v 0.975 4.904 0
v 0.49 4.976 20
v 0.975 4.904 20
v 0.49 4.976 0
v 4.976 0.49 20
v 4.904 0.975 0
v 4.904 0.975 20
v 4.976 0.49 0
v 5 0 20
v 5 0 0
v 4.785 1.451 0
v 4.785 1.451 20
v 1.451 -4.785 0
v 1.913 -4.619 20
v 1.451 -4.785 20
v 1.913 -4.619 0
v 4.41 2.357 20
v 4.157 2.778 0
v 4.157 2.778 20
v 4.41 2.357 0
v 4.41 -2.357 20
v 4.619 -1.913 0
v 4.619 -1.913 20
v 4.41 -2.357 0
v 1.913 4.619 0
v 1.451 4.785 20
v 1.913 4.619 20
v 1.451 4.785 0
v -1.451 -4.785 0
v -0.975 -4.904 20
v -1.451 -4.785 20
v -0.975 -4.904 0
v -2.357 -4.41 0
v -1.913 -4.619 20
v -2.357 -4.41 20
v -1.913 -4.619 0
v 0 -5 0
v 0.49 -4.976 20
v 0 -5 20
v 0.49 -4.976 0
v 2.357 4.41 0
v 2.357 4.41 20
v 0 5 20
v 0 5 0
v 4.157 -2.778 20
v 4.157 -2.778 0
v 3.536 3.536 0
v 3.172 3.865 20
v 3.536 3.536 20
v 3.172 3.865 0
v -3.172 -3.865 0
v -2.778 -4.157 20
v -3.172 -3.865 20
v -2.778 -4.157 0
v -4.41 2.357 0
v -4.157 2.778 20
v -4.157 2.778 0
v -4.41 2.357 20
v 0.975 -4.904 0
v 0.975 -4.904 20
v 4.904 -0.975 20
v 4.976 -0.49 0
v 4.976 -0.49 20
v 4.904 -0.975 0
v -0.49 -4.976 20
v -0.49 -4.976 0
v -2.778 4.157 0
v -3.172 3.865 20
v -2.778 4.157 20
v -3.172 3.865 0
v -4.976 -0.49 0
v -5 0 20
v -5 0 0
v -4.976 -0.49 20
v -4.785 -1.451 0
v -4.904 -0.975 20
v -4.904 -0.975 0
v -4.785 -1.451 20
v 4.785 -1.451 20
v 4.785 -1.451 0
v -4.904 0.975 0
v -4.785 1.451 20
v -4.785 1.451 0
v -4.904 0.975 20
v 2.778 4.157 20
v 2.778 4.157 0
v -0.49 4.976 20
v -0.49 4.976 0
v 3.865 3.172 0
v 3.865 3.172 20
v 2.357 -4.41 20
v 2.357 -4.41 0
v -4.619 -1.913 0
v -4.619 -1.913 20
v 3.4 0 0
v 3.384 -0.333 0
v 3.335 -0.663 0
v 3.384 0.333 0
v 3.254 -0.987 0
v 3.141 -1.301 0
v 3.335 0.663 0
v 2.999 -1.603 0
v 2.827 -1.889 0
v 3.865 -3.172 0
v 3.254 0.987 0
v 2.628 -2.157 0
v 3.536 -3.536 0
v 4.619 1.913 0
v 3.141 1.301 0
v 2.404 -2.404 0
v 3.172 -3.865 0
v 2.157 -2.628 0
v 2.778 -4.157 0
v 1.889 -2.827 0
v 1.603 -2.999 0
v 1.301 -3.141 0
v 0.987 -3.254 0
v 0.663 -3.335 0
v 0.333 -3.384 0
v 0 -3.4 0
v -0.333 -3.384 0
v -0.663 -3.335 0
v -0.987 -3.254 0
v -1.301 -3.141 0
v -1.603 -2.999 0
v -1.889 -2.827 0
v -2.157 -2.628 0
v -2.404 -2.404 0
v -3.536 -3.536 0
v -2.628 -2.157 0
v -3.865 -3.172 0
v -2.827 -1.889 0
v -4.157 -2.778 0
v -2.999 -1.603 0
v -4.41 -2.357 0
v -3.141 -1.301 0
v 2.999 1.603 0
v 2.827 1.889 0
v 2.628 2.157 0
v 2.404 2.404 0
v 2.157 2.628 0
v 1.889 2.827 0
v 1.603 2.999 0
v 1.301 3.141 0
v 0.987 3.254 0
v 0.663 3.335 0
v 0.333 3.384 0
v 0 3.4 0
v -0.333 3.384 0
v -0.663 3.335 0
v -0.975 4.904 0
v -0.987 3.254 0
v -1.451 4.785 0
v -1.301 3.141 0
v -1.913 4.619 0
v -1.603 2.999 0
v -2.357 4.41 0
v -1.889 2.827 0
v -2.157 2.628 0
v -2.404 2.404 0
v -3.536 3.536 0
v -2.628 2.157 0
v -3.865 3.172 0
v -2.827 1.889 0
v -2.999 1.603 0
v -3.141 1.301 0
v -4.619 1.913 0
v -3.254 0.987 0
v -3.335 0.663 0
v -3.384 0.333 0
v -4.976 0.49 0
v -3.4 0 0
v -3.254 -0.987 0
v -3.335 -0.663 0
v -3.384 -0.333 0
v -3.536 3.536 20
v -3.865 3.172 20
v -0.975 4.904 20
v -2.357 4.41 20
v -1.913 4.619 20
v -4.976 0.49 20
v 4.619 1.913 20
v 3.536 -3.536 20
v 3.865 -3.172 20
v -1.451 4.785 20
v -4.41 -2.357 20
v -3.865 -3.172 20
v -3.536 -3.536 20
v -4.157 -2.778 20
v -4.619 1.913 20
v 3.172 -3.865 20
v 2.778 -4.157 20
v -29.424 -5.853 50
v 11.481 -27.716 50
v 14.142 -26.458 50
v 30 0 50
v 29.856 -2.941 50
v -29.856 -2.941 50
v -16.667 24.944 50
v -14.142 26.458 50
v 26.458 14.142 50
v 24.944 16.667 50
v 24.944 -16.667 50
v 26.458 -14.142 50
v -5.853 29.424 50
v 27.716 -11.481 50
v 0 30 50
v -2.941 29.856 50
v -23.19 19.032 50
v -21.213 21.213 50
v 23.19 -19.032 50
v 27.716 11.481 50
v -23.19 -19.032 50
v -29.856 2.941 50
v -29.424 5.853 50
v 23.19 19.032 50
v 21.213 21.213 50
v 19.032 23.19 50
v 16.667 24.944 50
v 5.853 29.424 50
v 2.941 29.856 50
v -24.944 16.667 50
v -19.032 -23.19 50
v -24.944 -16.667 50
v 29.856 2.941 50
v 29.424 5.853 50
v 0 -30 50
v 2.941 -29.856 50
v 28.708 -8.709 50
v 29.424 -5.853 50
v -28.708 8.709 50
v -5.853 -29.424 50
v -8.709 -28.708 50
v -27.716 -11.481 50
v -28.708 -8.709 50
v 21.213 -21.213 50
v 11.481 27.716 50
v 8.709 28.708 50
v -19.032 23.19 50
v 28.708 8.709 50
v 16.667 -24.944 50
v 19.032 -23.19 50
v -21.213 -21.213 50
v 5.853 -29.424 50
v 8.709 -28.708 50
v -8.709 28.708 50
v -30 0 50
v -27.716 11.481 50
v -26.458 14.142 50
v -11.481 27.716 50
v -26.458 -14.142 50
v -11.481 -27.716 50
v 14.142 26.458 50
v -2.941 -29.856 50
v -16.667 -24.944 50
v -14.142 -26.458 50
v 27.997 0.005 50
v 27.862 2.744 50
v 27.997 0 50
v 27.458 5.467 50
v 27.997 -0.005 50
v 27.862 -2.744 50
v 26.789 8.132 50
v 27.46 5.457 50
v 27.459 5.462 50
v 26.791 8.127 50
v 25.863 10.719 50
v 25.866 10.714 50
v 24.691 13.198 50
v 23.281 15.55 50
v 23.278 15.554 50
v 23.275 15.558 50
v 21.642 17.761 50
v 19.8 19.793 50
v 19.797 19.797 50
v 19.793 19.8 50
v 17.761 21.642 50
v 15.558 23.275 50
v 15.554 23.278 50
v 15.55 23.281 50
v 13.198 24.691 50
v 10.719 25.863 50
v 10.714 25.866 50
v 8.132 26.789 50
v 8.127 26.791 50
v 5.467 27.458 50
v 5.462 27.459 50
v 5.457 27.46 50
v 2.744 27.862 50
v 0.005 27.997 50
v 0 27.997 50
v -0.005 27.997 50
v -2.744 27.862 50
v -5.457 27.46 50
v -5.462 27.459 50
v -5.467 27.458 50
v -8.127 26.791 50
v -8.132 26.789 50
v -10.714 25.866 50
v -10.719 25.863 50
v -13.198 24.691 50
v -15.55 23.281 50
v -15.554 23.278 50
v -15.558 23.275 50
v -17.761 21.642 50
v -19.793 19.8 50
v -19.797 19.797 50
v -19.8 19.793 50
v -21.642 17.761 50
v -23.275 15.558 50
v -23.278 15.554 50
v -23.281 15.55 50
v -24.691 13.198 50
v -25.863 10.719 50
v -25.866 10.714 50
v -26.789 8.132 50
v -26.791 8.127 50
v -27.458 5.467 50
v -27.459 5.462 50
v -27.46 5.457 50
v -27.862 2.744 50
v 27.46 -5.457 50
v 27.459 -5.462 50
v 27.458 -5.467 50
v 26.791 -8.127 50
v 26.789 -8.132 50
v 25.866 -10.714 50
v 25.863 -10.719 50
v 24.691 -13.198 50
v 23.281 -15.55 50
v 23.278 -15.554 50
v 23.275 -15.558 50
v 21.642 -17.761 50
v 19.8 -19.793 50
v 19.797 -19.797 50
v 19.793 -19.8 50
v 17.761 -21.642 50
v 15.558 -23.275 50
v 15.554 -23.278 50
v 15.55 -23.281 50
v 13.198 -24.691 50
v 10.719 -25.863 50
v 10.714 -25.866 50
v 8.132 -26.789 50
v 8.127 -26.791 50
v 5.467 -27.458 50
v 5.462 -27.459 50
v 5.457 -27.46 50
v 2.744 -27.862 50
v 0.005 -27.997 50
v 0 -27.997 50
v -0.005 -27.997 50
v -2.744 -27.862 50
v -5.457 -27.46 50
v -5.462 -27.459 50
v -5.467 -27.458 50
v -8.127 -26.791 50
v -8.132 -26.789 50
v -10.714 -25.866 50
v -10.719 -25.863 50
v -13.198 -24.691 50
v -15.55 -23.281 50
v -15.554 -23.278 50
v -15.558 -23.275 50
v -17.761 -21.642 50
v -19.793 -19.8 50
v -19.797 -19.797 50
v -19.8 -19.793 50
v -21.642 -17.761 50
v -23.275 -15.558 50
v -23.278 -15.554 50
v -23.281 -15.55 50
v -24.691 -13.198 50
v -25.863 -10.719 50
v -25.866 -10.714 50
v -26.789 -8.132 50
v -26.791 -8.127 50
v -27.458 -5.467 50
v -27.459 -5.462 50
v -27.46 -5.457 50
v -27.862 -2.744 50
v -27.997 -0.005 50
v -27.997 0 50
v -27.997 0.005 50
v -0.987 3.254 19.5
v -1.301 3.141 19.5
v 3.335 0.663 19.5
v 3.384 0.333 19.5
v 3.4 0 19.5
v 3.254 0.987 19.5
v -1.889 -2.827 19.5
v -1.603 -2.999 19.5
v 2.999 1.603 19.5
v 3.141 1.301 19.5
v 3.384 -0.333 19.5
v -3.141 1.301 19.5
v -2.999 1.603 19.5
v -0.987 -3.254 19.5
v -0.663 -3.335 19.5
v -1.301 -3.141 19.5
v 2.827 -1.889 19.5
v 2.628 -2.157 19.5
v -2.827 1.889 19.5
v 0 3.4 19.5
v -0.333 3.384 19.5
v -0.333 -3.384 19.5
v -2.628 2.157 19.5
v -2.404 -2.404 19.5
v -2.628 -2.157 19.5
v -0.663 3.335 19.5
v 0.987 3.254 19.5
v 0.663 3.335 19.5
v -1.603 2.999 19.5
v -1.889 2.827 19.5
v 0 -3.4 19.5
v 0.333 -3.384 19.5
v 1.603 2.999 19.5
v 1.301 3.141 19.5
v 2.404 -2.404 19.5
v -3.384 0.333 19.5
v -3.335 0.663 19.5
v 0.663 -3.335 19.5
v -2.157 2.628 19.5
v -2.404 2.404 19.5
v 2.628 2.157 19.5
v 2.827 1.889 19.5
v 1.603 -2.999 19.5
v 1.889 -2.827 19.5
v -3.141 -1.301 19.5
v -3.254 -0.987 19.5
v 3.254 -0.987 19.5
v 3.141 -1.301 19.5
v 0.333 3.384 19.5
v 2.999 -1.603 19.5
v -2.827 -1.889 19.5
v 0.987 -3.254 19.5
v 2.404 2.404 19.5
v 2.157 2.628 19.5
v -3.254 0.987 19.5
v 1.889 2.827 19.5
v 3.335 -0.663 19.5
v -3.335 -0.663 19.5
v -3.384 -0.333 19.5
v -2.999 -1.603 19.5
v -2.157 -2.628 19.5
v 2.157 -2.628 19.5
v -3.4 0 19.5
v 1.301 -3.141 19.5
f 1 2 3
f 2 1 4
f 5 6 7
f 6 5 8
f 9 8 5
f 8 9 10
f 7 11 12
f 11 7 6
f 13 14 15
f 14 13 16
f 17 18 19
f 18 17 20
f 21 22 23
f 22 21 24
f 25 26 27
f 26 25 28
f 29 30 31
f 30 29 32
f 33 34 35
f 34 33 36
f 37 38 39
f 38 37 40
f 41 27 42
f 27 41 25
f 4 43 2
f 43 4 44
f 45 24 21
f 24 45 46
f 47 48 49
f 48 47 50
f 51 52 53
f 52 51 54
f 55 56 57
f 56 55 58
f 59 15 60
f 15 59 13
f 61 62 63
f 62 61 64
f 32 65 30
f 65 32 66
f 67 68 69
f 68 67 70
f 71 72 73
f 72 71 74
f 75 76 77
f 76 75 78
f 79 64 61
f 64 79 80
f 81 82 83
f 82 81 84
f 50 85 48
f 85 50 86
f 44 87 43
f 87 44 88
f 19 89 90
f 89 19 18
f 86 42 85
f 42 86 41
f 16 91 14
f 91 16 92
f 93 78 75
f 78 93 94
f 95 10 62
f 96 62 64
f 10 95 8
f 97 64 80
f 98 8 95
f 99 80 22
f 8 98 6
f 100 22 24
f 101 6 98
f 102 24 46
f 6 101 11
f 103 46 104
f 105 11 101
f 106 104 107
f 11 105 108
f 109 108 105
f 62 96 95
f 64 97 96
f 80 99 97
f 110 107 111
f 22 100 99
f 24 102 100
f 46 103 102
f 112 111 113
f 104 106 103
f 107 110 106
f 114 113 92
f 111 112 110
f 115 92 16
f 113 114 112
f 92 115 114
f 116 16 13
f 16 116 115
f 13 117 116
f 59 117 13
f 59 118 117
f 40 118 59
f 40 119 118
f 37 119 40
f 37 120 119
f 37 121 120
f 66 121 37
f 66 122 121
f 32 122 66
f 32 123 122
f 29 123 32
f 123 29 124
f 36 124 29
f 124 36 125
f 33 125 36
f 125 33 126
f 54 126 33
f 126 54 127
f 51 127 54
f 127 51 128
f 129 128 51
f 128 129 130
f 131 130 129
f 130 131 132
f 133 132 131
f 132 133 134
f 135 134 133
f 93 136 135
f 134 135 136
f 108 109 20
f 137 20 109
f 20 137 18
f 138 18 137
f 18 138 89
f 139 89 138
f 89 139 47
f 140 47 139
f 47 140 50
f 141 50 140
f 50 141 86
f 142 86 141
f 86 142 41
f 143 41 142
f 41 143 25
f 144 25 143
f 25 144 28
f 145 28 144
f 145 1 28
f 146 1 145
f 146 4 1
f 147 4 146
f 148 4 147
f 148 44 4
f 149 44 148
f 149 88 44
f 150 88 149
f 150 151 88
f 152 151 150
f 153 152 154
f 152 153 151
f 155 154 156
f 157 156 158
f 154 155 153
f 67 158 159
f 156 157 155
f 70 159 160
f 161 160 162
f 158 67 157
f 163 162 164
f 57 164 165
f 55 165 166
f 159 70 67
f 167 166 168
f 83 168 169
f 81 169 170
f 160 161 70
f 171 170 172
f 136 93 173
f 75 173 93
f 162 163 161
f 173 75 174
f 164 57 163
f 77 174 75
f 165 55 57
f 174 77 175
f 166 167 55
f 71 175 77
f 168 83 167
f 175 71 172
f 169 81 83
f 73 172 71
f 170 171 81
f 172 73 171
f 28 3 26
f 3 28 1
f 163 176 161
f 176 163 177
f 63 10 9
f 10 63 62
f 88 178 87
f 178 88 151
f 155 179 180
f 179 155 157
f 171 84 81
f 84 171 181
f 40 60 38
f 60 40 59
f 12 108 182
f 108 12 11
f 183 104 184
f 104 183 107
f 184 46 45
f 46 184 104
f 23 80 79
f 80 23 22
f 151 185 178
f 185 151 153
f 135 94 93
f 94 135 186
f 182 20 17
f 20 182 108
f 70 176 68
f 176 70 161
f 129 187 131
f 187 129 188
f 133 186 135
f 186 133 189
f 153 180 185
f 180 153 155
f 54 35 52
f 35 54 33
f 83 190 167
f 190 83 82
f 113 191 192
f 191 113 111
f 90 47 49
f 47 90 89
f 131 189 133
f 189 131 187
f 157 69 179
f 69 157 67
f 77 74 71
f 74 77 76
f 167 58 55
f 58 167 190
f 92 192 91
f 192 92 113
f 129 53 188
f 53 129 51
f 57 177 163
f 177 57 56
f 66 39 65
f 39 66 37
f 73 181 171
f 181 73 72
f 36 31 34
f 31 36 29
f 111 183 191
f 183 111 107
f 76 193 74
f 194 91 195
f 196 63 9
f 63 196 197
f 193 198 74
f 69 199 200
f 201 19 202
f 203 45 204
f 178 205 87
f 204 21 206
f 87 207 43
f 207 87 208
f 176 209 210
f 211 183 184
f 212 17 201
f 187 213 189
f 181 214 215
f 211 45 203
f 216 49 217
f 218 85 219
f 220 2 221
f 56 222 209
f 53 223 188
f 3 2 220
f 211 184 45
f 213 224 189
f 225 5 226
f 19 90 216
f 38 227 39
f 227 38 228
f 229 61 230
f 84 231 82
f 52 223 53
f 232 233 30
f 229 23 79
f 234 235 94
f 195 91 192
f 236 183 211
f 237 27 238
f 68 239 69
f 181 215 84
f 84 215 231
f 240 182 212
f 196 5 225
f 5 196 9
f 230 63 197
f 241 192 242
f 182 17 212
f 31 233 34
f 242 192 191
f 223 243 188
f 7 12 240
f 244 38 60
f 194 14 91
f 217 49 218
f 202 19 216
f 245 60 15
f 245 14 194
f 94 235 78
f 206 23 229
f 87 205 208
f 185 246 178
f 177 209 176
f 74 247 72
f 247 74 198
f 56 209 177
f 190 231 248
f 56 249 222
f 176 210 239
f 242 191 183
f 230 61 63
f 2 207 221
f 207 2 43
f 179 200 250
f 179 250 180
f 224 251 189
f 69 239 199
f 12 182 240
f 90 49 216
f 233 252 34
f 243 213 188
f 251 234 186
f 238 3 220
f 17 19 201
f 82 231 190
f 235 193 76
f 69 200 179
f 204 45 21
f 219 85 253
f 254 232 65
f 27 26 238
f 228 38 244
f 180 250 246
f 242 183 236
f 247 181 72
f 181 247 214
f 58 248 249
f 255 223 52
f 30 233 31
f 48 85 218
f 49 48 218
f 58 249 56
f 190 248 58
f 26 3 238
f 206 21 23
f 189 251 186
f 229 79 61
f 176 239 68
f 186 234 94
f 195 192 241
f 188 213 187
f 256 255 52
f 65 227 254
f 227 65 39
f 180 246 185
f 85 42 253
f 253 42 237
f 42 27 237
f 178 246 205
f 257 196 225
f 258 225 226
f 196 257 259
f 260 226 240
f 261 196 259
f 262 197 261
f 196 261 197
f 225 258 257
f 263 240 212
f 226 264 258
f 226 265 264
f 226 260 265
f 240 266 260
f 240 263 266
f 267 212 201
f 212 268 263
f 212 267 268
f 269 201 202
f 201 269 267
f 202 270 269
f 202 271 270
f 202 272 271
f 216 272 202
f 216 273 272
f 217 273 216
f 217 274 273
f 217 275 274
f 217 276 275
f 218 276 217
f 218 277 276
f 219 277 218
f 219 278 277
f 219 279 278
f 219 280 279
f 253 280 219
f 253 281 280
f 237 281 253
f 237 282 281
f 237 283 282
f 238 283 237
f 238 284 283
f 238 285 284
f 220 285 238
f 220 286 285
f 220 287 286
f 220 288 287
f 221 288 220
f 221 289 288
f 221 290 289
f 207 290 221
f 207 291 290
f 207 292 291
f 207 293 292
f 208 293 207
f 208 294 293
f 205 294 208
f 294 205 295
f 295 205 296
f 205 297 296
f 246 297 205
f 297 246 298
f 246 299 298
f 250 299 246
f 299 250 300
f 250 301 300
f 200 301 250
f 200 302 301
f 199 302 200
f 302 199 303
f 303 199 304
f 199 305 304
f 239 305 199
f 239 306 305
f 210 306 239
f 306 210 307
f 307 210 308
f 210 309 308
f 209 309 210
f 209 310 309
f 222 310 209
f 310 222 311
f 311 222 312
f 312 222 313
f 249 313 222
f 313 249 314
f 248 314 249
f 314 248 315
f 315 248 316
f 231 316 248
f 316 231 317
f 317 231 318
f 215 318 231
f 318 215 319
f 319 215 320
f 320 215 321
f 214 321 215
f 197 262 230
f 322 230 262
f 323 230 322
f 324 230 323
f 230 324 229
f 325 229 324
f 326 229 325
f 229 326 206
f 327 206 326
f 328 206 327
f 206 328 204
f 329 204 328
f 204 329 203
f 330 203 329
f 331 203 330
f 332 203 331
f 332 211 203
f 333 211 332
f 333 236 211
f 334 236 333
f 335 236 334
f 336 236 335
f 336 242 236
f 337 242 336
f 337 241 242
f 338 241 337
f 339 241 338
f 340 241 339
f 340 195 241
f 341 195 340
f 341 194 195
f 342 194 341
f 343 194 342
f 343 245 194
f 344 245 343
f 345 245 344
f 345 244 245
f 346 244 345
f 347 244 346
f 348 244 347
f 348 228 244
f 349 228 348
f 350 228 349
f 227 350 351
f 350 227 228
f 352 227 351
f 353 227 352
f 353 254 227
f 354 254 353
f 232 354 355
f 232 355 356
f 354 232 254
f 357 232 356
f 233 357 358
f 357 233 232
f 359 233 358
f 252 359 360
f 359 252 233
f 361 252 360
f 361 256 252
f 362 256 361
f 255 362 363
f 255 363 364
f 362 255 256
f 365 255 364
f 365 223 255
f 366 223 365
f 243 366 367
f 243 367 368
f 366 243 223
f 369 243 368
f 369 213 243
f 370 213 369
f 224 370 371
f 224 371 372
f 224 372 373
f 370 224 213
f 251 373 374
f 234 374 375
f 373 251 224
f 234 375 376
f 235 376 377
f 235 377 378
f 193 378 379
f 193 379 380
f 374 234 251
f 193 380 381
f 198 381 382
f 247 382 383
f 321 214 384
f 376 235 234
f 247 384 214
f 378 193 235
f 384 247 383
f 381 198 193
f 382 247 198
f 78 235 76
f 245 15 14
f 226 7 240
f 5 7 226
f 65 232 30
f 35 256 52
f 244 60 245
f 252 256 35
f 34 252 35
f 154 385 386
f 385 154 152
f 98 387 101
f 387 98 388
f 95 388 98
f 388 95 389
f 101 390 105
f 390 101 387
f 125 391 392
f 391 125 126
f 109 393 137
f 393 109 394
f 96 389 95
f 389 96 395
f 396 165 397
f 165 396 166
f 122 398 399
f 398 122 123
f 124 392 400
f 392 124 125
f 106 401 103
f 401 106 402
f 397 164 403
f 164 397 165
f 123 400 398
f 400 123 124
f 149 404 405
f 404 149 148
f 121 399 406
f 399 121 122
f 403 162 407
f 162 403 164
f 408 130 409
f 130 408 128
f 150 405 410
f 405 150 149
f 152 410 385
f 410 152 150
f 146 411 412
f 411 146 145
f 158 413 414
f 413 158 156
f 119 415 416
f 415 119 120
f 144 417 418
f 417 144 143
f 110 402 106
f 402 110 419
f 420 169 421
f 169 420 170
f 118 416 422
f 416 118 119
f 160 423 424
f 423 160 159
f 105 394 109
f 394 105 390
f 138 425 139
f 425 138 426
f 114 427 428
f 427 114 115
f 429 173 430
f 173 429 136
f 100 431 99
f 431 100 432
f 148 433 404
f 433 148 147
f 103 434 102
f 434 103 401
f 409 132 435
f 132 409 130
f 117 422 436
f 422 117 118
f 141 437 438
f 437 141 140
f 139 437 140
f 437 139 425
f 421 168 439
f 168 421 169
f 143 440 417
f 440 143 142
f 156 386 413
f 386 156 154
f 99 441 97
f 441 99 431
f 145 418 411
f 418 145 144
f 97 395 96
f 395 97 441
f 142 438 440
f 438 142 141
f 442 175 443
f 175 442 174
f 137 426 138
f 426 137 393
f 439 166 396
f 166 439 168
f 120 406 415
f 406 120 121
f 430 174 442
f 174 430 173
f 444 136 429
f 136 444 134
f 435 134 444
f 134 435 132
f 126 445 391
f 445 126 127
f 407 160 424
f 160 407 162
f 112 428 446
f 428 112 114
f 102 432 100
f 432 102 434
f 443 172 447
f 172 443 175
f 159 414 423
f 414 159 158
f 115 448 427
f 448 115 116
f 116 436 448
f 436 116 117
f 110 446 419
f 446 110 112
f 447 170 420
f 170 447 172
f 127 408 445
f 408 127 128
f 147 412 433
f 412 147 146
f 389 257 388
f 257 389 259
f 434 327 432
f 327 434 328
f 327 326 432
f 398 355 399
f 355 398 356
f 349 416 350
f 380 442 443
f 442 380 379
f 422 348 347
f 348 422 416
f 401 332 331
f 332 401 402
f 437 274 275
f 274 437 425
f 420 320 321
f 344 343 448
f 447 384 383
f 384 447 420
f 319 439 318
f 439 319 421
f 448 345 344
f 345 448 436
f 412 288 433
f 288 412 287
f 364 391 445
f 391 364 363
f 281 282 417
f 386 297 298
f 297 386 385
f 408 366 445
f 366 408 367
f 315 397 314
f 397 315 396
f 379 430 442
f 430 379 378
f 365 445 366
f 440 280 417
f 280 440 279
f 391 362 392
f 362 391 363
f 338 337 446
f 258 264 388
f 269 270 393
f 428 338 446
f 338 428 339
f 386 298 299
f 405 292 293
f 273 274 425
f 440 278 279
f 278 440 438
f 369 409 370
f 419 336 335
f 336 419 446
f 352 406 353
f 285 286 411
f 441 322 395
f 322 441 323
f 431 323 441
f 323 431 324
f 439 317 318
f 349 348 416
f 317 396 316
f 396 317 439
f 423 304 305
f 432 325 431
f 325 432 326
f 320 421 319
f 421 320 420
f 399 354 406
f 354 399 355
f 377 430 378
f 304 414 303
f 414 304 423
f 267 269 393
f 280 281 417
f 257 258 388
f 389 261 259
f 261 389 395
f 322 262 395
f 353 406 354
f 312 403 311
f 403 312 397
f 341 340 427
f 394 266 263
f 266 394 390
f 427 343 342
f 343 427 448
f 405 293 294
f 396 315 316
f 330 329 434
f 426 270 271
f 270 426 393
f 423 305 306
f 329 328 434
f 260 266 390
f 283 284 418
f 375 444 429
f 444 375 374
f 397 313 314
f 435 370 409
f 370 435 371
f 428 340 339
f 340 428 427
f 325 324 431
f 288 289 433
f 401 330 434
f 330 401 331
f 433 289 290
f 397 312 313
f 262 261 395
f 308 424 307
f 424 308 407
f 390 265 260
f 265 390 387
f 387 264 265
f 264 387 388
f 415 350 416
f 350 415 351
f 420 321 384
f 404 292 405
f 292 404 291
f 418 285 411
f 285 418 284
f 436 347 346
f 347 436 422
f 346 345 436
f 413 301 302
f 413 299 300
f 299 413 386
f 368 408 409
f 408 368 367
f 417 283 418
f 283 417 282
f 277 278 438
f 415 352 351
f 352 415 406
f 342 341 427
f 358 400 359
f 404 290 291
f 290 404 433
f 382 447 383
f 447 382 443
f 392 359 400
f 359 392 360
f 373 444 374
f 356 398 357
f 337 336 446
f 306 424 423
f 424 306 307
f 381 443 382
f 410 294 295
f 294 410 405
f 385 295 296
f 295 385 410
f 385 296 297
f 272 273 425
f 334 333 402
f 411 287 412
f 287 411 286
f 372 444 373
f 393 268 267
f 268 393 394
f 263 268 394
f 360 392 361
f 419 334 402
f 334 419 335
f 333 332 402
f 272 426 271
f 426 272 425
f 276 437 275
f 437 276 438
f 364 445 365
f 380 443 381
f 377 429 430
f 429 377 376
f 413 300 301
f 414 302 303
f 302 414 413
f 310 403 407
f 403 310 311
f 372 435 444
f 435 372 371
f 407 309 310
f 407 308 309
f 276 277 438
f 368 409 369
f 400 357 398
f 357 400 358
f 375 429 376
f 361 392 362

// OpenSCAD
// Lab Funnel - Corrected version ensuring full spout length and proper funnel transition.
// Printed upright with the wide opening at the top.
// Spout: 10mm OD, 20mm long (z=0 to z=20). Funnel: widens from 10mm to 60mm over 30mm height (z=20 to z=50).
// Wall thickness: 1.6mm everywhere.

$fn = 64;

// Dimensions
spout_od      = 10;
wall_thickness = 1.6;
spout_id      = spout_od - 2 * wall_thickness; // 6.8 mm
spout_height  = 20;
funnel_bottom_od = spout_od;
funnel_top_od   = 60;
funnel_height   = 30;
funnel_top_id = funnel_top_od - 2 * wall_thickness; // 56.8 mm

// Build the part in one difference operation
difference() {
    // 1. The Outer Shell (Solid)
    union() {
        // Spout outer cylinder (z=0 to z=20)
        cylinder(h = spout_height, d = spout_od);
        
        // Funnel outer cone (z=20 to z=50)
        // Starts at z = spout_height with diameter = spout_od
        // Ends at z = spout_height + funnel_height with diameter = funnel_top_od
        translate([0, 0, spout_height]) 
            cylinder(h = funnel_height, 
                    d1 = spout_od, 
                    d2 = funnel_top_od, 
                    center = false);
    }
    
    // 2. The Inner Cavity (Holes)
    union() {
        // Spout inner cylinder (bore)
        // Must extend from z=0 to z=20. 
        // Extend 0.5mm past z=0 and z=20 to ensure clean cut.
        translate([0, 0, -0.5]) 
            cylinder(h = spout_height + 1, d = spout_id);
            
        // Funnel inner cone
        // Starts at z = spout_height (20) with diameter = spout_id
        // Ends at z = spout_height + funnel_height (50) with diameter = funnel_top_id
        // Extend 0.5mm past z=20 and z=50.
        translate([0, 0, spout_height - 0.5]) 
            cylinder(h = funnel_height + 1, 
                    d1 = spout_id, 
                    d2 = funnel_top_id, 
                    center = false);
    }
}
